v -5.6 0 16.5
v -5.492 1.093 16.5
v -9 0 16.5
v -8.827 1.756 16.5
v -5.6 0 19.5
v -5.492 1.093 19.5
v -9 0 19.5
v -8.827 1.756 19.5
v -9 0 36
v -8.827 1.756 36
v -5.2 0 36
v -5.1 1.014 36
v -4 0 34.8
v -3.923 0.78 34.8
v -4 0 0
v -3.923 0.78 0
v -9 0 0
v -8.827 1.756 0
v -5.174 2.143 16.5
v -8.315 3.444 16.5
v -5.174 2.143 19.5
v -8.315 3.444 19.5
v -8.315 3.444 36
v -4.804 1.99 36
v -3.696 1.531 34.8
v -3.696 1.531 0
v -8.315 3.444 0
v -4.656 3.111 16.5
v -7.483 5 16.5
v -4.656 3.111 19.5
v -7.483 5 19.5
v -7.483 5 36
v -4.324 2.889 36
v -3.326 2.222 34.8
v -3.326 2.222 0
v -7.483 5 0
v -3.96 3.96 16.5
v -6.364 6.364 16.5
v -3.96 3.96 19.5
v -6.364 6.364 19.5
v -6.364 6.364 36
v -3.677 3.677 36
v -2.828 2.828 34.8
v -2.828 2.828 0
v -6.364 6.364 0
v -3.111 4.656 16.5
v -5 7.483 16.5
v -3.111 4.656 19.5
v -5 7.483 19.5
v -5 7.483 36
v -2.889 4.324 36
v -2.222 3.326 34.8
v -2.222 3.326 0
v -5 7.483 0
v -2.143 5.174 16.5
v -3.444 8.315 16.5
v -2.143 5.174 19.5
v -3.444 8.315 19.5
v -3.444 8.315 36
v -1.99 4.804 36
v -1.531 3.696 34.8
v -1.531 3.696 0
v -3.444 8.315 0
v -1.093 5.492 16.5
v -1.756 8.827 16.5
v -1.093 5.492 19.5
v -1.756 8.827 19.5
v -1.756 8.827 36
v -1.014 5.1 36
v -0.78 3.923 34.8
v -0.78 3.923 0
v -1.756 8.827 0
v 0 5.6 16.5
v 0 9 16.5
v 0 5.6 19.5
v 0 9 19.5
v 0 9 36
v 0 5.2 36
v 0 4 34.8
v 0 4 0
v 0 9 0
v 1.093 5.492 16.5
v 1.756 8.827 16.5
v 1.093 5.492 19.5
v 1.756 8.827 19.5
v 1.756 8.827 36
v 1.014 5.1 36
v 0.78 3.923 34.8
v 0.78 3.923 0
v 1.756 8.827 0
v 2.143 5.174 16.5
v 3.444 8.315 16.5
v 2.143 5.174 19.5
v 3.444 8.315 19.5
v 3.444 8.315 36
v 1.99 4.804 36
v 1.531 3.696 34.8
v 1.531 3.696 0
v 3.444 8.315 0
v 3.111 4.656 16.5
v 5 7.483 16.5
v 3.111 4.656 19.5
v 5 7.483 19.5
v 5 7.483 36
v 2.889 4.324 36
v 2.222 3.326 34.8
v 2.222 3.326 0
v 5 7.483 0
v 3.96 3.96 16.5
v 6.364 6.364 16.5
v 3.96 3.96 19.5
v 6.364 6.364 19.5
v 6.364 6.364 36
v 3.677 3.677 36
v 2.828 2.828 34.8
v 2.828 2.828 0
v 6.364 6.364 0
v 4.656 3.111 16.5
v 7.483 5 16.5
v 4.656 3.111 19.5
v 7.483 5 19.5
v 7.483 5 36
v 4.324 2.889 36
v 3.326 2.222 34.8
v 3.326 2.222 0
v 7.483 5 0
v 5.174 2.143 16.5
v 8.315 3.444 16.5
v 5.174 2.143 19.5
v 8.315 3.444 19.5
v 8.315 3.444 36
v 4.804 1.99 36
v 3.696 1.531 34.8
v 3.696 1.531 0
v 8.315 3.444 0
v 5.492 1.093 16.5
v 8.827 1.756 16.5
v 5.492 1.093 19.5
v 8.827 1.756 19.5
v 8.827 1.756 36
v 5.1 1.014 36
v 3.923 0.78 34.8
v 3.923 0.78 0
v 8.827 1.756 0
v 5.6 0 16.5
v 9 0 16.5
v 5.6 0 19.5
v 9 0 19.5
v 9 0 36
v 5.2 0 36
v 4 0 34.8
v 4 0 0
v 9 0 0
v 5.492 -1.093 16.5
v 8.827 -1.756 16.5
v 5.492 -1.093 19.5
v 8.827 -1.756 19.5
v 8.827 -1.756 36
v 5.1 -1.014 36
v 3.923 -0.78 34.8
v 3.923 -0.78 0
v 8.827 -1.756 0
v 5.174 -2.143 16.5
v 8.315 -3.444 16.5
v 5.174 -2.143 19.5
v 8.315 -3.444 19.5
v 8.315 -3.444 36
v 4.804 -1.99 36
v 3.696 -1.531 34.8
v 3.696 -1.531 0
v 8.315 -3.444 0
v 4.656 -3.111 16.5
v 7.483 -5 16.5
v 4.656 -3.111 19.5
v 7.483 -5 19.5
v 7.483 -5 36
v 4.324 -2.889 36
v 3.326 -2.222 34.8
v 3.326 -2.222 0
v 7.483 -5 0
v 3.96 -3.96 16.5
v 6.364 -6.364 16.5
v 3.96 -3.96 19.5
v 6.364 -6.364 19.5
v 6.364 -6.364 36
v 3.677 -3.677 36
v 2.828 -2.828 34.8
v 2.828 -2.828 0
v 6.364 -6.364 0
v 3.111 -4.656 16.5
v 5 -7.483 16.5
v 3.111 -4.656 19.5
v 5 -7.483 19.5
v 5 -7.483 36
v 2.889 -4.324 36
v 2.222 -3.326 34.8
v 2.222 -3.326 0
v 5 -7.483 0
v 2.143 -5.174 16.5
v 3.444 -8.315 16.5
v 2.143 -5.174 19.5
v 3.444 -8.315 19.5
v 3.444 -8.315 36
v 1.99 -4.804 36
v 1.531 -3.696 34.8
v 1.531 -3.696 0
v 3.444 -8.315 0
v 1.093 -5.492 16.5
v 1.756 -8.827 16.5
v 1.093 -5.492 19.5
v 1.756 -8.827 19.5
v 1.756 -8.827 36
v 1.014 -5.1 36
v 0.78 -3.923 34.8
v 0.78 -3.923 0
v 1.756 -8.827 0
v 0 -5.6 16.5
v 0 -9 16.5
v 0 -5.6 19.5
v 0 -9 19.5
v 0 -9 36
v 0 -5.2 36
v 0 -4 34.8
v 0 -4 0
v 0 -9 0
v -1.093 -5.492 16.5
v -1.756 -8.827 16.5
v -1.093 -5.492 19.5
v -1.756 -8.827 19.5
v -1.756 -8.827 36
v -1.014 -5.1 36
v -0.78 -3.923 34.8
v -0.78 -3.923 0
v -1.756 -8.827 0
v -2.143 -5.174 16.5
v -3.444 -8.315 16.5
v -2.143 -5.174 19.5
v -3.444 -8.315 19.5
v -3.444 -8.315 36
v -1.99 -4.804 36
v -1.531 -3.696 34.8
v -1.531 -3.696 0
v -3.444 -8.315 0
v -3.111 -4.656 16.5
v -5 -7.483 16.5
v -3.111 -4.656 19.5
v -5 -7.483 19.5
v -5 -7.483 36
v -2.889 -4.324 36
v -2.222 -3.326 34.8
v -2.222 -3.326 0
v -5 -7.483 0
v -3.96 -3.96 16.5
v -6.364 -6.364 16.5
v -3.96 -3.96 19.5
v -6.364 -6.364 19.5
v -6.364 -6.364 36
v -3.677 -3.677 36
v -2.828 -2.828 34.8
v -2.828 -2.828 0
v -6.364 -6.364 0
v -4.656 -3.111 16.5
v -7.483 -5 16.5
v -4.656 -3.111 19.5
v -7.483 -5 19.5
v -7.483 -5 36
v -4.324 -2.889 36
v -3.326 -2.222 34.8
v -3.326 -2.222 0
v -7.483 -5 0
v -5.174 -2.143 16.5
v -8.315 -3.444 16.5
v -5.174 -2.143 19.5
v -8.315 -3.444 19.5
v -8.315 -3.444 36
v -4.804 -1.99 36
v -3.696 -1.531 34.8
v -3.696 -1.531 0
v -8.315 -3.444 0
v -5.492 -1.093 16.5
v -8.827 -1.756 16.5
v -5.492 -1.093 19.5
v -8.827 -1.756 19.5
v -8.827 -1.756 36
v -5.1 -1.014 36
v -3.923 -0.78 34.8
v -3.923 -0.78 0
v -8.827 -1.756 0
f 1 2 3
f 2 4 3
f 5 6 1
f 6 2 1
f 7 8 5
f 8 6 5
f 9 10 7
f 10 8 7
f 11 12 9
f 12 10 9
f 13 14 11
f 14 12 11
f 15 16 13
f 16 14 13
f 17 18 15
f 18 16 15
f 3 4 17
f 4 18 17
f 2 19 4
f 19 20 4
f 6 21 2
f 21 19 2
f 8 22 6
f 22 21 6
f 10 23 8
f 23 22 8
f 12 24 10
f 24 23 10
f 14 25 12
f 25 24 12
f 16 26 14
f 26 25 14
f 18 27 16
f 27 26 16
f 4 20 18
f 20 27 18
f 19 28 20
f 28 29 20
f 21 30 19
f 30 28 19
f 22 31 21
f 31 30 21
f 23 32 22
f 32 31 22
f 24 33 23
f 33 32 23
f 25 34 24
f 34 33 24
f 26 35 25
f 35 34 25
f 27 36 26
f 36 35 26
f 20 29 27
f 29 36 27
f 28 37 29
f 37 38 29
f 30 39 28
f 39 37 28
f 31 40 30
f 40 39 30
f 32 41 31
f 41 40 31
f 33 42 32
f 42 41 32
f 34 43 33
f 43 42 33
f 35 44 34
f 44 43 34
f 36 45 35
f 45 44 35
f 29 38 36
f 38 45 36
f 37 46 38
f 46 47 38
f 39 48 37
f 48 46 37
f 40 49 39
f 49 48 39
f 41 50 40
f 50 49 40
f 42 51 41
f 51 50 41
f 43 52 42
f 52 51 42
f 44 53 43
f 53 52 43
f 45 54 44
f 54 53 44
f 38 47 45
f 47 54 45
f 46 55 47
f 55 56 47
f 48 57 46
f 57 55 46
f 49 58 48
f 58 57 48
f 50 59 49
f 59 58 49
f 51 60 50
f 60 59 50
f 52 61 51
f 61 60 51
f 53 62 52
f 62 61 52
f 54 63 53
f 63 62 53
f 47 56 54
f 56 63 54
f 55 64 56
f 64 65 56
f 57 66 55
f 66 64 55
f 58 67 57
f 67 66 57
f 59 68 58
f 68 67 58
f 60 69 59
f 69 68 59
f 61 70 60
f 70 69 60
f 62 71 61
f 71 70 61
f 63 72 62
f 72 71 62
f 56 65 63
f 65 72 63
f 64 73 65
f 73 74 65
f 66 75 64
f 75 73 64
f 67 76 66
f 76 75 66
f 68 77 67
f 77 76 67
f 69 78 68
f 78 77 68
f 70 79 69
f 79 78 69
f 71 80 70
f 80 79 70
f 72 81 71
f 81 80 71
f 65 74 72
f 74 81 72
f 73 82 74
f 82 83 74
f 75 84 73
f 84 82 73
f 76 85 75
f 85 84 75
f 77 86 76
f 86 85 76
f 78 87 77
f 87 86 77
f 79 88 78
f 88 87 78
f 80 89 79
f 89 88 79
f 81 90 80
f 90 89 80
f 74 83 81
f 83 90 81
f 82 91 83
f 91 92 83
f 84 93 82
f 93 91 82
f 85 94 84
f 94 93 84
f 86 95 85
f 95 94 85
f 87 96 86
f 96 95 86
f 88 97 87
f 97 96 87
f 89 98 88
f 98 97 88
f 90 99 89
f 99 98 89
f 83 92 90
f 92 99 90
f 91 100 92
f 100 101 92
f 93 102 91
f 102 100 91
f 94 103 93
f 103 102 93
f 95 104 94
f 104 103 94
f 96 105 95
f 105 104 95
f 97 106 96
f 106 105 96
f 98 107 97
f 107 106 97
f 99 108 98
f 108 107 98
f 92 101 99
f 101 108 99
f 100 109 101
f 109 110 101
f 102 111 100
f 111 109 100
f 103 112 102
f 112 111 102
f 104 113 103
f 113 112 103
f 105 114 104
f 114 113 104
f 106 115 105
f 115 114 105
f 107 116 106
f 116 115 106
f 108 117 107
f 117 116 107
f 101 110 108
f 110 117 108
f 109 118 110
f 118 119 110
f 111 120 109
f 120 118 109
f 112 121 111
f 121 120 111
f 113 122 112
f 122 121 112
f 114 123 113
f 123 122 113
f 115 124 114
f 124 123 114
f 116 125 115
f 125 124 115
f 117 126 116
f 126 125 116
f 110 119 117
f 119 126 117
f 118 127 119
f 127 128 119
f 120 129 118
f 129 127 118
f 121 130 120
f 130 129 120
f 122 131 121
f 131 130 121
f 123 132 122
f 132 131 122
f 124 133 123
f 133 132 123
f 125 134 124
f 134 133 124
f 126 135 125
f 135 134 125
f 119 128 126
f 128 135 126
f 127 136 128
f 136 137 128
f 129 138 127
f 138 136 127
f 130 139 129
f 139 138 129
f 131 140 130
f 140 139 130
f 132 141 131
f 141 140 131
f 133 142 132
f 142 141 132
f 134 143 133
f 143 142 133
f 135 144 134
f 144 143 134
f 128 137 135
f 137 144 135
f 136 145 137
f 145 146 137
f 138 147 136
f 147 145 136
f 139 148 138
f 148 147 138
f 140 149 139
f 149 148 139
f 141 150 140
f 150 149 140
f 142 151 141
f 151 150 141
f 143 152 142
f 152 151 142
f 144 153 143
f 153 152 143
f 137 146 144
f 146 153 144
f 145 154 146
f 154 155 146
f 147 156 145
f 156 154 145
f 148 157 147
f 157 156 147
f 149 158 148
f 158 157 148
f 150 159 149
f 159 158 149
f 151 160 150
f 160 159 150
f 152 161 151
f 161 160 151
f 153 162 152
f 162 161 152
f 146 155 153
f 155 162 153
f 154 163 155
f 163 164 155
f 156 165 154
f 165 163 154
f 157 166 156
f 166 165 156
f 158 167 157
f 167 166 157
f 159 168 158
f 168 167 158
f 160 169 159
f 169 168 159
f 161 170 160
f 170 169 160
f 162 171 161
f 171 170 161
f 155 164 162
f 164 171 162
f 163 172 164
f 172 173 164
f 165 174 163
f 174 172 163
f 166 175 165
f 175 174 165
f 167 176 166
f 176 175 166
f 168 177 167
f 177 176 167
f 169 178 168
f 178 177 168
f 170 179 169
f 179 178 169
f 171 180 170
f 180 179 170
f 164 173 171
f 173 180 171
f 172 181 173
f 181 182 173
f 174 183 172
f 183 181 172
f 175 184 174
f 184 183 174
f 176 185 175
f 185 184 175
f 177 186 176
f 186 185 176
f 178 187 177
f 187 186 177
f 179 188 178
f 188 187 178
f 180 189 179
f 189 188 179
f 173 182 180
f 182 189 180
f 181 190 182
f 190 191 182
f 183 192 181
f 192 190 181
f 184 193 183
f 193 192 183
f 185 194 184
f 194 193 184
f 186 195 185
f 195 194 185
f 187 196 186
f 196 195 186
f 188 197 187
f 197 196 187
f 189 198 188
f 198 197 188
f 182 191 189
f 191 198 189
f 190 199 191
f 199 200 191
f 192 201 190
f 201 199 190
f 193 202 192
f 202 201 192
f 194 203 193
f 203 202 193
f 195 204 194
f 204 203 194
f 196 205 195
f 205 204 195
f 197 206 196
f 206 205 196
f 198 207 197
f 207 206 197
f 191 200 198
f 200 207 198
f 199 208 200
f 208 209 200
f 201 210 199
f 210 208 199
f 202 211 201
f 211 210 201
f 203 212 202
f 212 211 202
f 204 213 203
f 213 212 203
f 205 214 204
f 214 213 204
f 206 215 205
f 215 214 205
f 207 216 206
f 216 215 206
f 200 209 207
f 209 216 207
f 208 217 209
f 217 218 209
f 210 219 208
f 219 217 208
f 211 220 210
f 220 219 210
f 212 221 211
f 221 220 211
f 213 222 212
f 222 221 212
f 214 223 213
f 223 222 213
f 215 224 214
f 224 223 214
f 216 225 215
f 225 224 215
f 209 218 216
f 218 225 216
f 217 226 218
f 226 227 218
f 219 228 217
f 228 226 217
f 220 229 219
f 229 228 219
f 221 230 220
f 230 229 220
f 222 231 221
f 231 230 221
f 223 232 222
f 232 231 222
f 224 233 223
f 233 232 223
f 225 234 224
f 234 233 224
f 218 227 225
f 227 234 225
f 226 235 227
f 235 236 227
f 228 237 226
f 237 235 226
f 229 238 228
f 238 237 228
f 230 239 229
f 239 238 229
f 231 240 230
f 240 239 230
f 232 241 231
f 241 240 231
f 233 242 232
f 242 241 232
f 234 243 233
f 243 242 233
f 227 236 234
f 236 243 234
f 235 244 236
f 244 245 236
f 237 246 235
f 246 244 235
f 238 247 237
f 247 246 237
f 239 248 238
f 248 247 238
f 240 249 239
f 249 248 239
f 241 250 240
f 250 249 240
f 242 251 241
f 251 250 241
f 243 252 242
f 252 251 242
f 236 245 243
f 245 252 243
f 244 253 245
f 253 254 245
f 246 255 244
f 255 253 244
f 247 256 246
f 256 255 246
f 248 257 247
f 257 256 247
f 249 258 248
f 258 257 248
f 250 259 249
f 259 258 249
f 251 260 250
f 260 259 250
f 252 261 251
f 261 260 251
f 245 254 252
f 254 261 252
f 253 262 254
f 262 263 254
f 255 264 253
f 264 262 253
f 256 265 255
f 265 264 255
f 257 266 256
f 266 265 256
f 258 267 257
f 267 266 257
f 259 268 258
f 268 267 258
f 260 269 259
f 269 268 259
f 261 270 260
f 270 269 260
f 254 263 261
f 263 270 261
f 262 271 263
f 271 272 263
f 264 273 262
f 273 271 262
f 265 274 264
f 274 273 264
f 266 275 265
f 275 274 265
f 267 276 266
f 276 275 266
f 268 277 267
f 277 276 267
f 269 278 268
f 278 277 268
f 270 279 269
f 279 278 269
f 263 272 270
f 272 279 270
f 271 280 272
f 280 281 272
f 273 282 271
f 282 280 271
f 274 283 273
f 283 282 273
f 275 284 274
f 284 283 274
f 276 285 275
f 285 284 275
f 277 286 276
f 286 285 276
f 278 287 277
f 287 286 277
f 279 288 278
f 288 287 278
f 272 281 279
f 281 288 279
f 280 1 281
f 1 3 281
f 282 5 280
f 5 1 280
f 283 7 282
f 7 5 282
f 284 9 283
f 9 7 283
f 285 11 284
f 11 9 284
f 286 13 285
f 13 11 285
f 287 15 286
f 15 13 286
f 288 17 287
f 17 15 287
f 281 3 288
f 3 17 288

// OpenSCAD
$fn = 32;

// ----------------------------------------------------------------------
// Grooved revolve: thread_relief, bore R4
// ----------------------------------------------------------------------

// --- parameters (mm) ---
bore_r = 4;               // bore radius
outer_r = 9;              // outer radius of the body
total_h = 36;             // overall height, Z
wall = 5;                 // radial wall thickness
groove_w = 3;             // groove width
groove_d = 3.4;           // groove depth
grooves = 1;              // number of outer grooves
relief = 1.2;             // thread relief leg at the bore mouth
relief_angle = 45;        // thread relief chamfer angle, degrees

bbox_x = 2 * outer_r;  // full diameter
bore_d = 2 * bore_r;  // bore diameter
body_d = 2 * outer_r;  // body diameter
revolve_angle = 360;  // full turn around the Z axis

profile = [[4, 0], [9, 0], [9, 16.5], [5.6, 16.5], [5.6, 19.5], [9, 19.5], [9, 36], [5.2, 36], [4, 34.8]];  // primary outline, 9 points, counter clockwise

// --- the one profile operation ---
rotate_extrude(angle = revolve_angle) polygon(points = profile);
